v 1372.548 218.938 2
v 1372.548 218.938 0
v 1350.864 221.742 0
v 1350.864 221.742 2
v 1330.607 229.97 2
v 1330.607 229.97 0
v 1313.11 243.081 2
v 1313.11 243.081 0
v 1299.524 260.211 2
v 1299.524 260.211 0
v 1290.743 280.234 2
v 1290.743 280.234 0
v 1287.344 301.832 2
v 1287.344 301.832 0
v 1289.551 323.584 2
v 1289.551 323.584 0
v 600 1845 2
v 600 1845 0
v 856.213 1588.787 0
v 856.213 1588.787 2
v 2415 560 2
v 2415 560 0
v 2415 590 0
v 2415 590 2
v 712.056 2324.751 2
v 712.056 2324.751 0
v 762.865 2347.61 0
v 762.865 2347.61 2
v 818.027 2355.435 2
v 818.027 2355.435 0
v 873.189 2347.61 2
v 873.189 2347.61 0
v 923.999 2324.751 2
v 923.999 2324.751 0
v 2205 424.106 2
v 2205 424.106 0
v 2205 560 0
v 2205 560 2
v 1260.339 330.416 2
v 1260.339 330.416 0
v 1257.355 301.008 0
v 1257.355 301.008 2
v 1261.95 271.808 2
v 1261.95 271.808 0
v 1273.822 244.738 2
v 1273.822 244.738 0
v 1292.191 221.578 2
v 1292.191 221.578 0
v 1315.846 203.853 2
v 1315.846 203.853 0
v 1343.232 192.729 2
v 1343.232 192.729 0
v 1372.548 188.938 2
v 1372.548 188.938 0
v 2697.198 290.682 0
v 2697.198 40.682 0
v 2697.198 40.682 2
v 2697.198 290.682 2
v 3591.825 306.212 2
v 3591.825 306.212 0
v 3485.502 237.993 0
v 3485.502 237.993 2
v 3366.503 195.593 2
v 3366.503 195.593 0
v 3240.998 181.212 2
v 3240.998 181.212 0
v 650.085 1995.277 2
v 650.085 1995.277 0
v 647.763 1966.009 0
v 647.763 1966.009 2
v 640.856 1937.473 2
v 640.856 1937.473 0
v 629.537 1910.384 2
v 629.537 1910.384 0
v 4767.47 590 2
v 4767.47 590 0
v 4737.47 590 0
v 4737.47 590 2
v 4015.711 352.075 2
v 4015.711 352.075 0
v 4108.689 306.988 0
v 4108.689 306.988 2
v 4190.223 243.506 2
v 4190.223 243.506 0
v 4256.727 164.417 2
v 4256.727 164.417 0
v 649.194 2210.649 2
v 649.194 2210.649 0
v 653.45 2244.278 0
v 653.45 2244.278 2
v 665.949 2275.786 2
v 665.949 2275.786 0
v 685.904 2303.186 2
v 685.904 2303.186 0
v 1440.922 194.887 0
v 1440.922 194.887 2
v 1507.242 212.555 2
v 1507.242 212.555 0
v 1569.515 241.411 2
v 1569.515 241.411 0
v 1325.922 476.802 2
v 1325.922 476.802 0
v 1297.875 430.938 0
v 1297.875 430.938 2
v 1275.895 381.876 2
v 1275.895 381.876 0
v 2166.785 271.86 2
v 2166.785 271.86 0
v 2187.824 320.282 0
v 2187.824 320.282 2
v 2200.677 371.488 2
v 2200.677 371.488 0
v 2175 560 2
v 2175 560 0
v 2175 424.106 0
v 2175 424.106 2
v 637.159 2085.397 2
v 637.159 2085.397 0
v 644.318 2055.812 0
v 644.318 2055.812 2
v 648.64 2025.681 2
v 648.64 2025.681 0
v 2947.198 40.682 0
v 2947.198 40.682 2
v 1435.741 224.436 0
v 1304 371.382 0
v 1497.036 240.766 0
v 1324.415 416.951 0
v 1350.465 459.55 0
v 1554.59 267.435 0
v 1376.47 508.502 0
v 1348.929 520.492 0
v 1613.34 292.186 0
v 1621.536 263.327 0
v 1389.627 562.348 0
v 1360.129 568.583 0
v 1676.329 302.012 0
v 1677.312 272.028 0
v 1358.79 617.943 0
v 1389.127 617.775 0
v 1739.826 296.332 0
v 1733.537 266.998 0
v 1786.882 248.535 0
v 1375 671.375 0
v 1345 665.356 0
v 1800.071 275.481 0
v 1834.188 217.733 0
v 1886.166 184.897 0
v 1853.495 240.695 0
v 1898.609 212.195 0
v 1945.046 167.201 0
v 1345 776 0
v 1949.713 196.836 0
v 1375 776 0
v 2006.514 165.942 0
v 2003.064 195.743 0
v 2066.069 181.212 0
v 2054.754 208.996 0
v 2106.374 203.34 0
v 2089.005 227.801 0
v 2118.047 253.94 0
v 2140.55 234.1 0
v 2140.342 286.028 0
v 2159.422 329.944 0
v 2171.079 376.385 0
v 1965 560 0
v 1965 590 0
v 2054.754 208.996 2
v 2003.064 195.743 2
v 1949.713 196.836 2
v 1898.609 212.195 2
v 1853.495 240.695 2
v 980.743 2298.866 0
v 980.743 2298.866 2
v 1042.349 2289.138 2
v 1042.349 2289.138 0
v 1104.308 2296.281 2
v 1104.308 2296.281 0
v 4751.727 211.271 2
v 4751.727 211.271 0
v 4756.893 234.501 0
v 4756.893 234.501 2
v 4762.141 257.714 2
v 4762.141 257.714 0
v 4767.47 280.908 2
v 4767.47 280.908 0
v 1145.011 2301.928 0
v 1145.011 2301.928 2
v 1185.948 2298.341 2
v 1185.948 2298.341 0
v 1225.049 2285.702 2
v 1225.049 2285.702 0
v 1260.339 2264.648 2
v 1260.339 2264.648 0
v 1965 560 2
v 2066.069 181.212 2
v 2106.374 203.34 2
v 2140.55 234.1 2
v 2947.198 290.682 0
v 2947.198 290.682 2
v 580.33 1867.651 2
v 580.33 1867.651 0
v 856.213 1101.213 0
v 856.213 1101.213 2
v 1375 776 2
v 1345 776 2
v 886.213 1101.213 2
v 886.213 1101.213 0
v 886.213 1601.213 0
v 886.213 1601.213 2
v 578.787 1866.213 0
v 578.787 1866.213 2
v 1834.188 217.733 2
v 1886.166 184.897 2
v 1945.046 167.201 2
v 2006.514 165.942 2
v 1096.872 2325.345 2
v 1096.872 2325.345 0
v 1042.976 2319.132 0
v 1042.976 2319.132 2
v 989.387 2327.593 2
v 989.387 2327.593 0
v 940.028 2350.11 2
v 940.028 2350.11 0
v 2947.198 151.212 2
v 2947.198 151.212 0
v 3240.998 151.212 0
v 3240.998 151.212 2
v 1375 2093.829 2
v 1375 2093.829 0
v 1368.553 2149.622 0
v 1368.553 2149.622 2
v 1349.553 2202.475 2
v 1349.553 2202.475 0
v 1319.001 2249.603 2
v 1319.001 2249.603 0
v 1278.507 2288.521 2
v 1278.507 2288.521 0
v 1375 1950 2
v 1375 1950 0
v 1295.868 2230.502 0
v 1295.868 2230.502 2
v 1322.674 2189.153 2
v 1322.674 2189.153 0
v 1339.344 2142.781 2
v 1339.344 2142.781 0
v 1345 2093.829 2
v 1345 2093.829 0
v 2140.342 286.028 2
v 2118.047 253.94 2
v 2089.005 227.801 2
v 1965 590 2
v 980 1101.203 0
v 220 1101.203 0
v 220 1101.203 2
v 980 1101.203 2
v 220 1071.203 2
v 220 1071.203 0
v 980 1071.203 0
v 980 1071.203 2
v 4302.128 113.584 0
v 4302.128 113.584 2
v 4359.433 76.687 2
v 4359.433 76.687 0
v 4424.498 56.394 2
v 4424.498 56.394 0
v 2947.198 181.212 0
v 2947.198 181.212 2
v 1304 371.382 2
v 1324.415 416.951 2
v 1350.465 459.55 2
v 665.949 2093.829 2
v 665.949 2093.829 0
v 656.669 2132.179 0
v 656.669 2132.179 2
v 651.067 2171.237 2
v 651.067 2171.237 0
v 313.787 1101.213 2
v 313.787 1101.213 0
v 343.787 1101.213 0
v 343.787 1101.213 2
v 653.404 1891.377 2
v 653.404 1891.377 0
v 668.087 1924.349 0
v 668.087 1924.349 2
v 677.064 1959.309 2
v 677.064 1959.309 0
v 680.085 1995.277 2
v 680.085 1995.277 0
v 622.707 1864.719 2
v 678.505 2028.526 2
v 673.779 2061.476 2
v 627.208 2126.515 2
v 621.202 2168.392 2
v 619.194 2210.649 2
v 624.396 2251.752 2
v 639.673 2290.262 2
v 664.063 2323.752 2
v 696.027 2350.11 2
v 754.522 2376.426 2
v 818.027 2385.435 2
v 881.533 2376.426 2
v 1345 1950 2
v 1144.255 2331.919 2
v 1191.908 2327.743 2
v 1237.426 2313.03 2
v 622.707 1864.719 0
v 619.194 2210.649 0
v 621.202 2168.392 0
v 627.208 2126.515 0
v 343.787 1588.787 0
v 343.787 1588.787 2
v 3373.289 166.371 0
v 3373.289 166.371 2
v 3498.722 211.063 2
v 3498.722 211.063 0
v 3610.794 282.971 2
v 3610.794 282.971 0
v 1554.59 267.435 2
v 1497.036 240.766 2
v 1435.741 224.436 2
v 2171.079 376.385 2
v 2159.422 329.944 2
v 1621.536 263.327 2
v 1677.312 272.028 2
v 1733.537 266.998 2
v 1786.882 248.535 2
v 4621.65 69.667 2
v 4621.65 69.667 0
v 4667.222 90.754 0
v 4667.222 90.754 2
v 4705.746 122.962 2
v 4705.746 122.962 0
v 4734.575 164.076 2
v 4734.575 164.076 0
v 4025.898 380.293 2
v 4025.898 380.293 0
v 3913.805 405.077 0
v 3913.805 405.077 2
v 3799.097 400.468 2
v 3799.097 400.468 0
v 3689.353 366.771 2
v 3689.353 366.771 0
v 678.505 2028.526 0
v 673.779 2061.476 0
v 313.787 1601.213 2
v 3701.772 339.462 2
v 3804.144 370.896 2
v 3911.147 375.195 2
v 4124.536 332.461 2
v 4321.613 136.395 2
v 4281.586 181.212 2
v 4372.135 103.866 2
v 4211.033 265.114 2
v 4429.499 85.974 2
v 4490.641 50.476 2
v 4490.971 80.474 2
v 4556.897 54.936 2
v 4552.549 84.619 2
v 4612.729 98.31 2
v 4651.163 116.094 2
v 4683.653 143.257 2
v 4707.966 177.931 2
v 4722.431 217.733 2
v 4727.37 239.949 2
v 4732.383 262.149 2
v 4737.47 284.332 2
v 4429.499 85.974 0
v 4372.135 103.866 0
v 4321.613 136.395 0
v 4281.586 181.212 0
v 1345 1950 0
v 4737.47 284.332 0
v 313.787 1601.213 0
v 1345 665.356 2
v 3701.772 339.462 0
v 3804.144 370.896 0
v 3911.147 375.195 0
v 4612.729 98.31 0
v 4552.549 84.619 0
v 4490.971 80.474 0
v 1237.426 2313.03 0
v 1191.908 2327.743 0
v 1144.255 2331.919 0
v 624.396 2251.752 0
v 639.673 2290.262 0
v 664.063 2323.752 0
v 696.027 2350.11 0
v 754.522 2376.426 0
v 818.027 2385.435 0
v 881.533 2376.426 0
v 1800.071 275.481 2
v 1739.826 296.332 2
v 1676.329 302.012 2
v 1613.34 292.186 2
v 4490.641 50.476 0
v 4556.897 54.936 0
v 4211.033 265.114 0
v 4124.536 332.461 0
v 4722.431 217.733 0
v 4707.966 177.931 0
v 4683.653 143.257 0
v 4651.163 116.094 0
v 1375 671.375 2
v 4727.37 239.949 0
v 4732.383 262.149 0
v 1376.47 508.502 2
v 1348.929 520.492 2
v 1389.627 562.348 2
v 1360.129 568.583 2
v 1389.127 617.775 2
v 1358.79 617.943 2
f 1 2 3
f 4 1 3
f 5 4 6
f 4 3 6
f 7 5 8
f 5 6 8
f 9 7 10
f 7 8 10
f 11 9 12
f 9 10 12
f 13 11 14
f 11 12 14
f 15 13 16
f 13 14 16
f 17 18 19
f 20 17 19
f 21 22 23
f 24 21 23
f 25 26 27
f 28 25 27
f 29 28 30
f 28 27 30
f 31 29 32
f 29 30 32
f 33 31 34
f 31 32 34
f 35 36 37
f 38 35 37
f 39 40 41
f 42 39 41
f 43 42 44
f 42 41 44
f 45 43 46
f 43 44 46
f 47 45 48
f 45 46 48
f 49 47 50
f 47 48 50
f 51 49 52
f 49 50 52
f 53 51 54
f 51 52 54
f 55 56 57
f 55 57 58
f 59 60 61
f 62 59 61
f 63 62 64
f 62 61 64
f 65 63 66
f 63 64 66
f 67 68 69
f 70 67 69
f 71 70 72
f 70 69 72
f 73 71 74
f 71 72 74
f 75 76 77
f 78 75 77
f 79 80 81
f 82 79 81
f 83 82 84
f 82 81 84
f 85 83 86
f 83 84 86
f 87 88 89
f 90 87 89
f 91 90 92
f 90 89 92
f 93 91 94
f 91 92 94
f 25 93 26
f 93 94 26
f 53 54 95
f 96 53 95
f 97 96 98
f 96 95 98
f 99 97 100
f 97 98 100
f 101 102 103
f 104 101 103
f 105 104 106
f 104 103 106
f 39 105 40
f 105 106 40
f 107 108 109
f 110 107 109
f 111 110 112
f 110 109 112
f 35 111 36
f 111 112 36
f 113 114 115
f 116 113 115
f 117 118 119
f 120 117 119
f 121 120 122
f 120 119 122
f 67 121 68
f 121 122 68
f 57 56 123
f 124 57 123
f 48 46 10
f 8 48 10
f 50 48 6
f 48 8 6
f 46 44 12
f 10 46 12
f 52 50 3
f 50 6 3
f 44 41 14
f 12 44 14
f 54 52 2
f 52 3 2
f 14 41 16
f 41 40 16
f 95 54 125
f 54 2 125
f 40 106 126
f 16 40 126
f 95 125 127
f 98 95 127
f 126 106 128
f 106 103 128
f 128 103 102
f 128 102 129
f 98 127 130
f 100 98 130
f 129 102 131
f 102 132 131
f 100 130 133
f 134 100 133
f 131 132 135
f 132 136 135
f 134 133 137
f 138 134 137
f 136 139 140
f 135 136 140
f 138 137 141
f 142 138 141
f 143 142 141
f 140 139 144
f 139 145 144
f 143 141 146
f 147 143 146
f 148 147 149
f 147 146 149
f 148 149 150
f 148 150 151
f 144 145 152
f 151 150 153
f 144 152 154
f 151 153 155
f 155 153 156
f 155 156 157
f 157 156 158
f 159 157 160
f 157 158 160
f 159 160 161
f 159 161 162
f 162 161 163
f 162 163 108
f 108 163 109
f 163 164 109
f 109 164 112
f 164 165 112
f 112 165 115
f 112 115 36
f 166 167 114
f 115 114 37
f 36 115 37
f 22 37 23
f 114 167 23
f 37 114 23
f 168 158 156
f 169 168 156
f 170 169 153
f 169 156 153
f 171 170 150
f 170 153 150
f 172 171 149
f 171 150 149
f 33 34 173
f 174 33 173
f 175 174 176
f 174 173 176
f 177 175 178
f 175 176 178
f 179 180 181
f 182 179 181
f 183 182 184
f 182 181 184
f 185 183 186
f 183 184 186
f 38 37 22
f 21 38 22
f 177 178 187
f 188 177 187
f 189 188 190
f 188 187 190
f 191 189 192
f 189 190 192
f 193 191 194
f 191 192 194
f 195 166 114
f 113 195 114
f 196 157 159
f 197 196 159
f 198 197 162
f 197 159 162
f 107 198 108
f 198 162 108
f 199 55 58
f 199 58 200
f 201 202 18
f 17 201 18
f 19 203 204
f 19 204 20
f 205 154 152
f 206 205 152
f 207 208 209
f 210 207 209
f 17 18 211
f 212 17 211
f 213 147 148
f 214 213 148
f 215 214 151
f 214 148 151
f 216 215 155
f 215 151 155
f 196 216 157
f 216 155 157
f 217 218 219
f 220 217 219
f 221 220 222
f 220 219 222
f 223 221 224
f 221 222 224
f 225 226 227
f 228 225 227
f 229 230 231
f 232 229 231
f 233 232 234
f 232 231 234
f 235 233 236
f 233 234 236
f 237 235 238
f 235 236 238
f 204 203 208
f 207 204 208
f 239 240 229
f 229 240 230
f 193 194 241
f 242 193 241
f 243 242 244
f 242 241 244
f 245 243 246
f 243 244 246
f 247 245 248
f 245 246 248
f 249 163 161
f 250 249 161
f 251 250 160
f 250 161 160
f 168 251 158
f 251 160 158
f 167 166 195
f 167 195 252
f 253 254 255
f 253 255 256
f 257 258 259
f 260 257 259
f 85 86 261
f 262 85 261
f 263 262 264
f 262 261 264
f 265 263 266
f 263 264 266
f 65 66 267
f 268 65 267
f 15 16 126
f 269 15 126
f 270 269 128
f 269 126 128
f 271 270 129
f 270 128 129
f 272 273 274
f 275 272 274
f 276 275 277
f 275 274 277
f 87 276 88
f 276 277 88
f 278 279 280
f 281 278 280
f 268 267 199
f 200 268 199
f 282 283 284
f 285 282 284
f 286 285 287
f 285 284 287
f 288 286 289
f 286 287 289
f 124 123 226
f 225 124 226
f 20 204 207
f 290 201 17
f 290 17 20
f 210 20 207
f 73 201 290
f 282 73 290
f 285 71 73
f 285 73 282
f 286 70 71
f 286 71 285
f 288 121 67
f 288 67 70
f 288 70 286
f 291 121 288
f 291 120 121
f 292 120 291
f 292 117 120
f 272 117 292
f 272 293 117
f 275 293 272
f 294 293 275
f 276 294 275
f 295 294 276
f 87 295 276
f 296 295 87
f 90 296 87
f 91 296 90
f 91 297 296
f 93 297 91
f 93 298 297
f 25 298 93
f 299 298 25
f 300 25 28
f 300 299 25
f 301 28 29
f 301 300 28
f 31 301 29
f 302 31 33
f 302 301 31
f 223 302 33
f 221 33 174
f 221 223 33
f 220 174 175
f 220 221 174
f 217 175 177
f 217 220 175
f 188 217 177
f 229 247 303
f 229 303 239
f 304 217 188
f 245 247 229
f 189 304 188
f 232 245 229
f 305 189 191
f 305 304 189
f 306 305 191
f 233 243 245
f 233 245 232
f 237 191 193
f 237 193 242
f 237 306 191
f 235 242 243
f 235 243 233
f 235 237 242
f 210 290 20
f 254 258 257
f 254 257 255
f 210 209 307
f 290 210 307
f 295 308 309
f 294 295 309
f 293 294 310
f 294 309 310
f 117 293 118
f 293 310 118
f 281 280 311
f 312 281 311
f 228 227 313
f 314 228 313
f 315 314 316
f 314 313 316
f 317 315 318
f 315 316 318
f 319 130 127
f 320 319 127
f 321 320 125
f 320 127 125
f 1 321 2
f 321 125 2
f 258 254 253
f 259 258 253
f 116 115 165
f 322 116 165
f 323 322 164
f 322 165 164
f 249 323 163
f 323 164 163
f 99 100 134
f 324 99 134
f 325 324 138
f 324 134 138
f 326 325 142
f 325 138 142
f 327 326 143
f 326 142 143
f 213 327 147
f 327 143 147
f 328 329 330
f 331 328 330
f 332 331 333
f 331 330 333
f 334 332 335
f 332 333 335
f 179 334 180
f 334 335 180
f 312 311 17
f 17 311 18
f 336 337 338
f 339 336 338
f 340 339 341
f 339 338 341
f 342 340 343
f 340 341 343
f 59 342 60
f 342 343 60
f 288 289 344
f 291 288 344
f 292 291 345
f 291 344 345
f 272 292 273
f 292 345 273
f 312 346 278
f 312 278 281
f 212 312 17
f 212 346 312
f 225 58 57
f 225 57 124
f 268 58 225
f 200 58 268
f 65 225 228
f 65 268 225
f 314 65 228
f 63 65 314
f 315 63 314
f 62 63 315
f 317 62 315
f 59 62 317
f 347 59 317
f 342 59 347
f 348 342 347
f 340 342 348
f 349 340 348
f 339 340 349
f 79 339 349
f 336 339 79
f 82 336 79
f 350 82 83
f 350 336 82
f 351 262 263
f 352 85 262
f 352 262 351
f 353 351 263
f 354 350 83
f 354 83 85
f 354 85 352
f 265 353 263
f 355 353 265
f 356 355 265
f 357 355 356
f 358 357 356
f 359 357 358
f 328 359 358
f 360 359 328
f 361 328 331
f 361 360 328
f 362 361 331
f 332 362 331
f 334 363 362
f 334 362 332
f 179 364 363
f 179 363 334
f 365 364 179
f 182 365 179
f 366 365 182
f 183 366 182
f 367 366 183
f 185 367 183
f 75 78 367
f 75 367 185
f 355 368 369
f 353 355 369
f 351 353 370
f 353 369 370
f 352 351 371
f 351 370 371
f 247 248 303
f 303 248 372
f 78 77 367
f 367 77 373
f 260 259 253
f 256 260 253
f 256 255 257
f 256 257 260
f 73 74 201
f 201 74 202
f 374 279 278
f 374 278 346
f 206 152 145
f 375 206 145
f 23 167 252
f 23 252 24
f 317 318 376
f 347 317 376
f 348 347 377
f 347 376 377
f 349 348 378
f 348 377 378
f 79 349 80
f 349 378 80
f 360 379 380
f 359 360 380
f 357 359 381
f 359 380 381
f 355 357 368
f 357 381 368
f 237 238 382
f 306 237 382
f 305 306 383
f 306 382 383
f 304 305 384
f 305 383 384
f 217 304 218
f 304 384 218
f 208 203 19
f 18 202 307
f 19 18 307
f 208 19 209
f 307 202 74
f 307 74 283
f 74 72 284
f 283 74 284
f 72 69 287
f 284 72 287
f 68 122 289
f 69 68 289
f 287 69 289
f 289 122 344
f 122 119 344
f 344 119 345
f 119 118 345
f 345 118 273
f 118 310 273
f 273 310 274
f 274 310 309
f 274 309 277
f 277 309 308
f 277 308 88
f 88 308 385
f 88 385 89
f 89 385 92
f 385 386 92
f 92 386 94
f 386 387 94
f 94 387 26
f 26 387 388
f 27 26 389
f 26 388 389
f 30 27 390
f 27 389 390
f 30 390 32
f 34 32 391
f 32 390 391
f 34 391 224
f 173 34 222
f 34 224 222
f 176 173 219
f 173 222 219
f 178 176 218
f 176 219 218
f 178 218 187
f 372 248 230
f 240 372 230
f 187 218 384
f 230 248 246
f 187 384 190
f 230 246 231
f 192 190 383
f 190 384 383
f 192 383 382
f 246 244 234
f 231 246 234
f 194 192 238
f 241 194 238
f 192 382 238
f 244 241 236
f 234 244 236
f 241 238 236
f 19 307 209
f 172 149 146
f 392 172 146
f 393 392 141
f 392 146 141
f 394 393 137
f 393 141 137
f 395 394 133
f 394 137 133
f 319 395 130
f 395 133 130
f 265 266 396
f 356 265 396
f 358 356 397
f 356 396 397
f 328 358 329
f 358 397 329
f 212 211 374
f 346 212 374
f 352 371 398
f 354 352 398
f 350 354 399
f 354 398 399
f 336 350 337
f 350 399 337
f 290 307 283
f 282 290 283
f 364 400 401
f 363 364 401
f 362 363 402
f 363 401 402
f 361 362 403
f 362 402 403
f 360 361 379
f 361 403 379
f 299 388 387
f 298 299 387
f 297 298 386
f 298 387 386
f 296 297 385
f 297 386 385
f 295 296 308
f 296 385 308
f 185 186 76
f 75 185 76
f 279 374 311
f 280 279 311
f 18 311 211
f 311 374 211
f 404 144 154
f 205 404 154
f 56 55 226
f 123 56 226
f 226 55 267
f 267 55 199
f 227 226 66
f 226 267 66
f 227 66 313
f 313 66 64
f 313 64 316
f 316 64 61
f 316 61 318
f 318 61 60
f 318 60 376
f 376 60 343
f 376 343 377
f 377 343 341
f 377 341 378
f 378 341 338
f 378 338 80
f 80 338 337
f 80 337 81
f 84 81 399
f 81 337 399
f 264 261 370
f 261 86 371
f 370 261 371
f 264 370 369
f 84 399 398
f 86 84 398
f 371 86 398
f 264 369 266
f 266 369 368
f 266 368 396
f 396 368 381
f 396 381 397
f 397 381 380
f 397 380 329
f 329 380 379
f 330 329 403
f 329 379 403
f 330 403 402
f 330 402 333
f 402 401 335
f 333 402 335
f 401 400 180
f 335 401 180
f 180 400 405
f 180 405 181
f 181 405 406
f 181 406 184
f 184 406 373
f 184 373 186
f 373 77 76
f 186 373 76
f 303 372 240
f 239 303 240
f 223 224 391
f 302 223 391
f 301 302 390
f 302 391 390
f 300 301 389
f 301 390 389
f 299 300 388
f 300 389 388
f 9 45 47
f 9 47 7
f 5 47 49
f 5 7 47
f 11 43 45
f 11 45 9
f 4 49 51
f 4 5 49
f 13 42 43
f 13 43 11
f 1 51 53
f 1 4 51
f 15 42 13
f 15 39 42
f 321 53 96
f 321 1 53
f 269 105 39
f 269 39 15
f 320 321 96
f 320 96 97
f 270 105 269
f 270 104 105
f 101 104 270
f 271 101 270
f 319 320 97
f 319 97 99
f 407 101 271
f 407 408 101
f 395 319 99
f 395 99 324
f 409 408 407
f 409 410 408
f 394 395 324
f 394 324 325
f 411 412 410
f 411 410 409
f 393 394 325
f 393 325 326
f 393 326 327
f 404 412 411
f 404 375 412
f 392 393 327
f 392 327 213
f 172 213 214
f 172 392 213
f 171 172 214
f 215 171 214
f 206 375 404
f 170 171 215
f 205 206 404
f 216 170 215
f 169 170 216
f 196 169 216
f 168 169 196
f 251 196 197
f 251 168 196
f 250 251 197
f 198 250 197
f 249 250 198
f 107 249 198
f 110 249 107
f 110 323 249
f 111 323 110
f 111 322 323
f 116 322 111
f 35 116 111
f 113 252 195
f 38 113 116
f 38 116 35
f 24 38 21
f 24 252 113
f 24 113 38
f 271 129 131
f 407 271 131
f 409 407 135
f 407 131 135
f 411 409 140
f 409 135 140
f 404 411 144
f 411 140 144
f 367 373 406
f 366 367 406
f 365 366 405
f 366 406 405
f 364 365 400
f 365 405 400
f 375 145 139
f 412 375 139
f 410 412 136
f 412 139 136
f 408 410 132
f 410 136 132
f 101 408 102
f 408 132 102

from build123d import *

# Parameters (mm, degrees)
EXTRUDE_THIN4_DEPTH = 2
SKETCH3_W           = 250
SKETCH3_H           = 250
BOSS_EXTRUDE3_DEPTH = 2
SKETCH4_W           = 450
SKETCH4_H           = 30
BOSS_EXTRUDE4_DEPTH = 2
SKETCH5_W           = 30
SKETCH5_H           = 500
BOSS_EXTRUDE5_DEPTH = 2
SKETCH6_W           = 760
SKETCH6_H           = 30
BOSS_EXTRUDE7_DEPTH = 2


# Read off the part's stored shape, not the designer's step: Extrude-Thin4
with BuildPart() as part:
    # Extrude-Thin4 outline → Extrude-Thin4 (new body)
    with BuildSketch(Plane.XY):
        with BuildLine():
            Line((580.329534742, 1867.651110272), (600, 1845))
            Line((600, 1845), (865, 1580))
            Line((865, 1580), (886.213203436, 1601.213203436))
            Line((886.213203436, 1601.213203436), (622.7072175, 1864.719189371))
            Line((622.7072175, 1864.719189371), (653.403971795, 1891.376577537))
            ThreePointArc((653.403971795, 1891.376577537), (673.30803603, 1941.641063842), (680.084696225, 1995.276567319))
            ThreePointArc((680.084696225, 1995.276567319), (676.532858701, 2045.057080452), (665.949306803, 2093.829034142))
            ThreePointArc((665.949306803, 2093.829034142), (653.403971795, 2151.641430576), (649.193760322, 2210.649334548))
            ThreePointArc((649.193760322, 2210.649334548), (665.949306803, 2275.785664392), (712.05624475, 2324.751367457))
            ThreePointArc((712.05624475, 2324.751367457), (818.027452504, 2355.435014772), (923.998660258, 2324.751367457))
            ThreePointArc((923.998660258, 2324.751367457), (1011.215225634, 2291.908815799), (1104.307879422, 2296.281490747))
            ThreePointArc((1104.307879422, 2296.281490747), (1185.947658515, 2298.341290514), (1260.339044564, 2264.648294402))
            ThreePointArc((1260.339044564, 2264.648294402), (1322.673710037, 2189.153082854), (1345, 2093.829034142))
            Line((1345, 2093.829034142), (1345, 1950))
            Line((1345, 1950), (1375, 1950))
            Line((1375, 1950), (1375, 2093.829034142))
            ThreePointArc((1375, 2093.829034142), (1349.553484223, 2202.475160007), (1278.507195252, 2288.521256108))
            ThreePointArc((1278.507195252, 2288.521256108), (1191.90848294, 2327.743136922), (1096.871945536, 2325.345332324))
            ThreePointArc((1096.871945536, 2325.345332324), (1015.894102839, 2321.541704759), (940.027651252, 2350.110220896))
            ThreePointArc((940.027651252, 2350.110220896), (818.027452504, 2385.435014772), (696.027253756, 2350.110220896))
            ThreePointArc((696.027253756, 2350.110220896), (639.673179521, 2290.262029098), (619.193760322, 2210.649334548))
            ThreePointArc((619.193760322, 2210.649334548), (623.707873677, 2147.382116479), (637.158757241, 2085.396700186))
            ThreePointArc((637.158757241, 2085.396700186), (646.836760583, 2040.797766355), (650.084696225, 1995.276567319))
            ThreePointArc((650.084696225, 1995.276567319), (644.874732457, 1951.604472445), (629.537269054, 1910.383630513))
            Line((629.537269054, 1910.383630513), (580.329534742, 1867.651110272))
        make_face()
        Polygon((578.786796564, 1866.213203436), (313.786796564, 1601.213203436), (335, 1580), (600, 1845), align=None)
        with BuildLine():
            Line((1375, 671.37495586), (1375, 776))
            Line((1375, 776), (1345, 776))
            Line((1345, 776), (1345, 665.356203402))
            ThreePointArc((1345, 665.356203402), (1360.128516063, 568.583046436), (1325.921730839, 476.80172071))
            ThreePointArc((1325.921730839, 476.80172071), (1286.101995144, 406.757699666), (1260.339044564, 330.416055643))
            ThreePointArc((1260.339044564, 330.416055643), (1282.260904948, 232.566505826), (1372.547552838, 188.938262968))
            ThreePointArc((1372.547552838, 188.938262968), (1474.465890598, 202.281284498), (1569.514565573, 241.410981413))
            ThreePointArc((1569.514565573, 241.410981413), (1705.577822181, 271.230050509), (1834.187549466, 217.73309052))
            ThreePointArc((1834.187549466, 217.73309052), (1945.045622854, 167.201036401), (2066.069190222, 181.211642034))
            ThreePointArc((2066.069190222, 181.211642034), (2124.350152694, 217.73309052), (2166.78545843, 271.860085755))
            ThreePointArc((2166.78545843, 271.860085755), (2195.300446849, 345.621452904), (2205, 424.105607464))
            Line((2205, 424.105607464), (2205, 560))
            Line((2205, 560), (2175, 560))
            Line((2175, 560), (2175, 424.105607464))
            ThreePointArc((2175, 424.105607464), (2166.203072501, 352.92506886), (2140.341645499, 286.02782226))
            ThreePointArc((2140.341645499, 286.02782226), (2104.28074565, 240.031496313), (2054.754439327, 208.996105537))
            ThreePointArc((2054.754439327, 208.996105537), (1949.713097583, 196.835723503), (1853.494807006, 240.694575801))
            ThreePointArc((1853.494807006, 240.694575801), (1708.250974391, 301.110717457), (1554.589589012, 267.434914142))
            ThreePointArc((1554.589589012, 267.434914142), (1466.743131436, 231.270230511), (1372.547552838, 218.938262968))
            ThreePointArc((1372.547552838, 218.938262968), (1305.765674919, 251.2085494), (1289.550840964, 323.58444155))
            ThreePointArc((1289.550840964, 323.58444155), (1313.479960119, 394.492014451), (1350.465289002, 459.550235189))
            ThreePointArc((1350.465289002, 459.550235189), (1389.627244127, 562.34751421), (1375, 671.37495586))
        make_face()
        with BuildLine():
            Line((4767.469655509, 280.907659612), (4767.469655509, 590))
            Line((4767.469655509, 590), (4737.469655509, 590))
            Line((4737.469655509, 590), (4737.469655509, 284.332140954))
            ThreePointArc((4737.469655509, 284.332140954), (4729.867341385, 251.051330007), (4722.430778015, 217.73309052))
            ThreePointArc((4722.430778015, 217.73309052), (4683.652807685, 143.257064619), (4612.729150001, 98.30993793))
            ThreePointArc((4612.729150001, 98.30993793), (4521.841227213, 81.341666779), (4429.499055865, 85.974174218))
            ThreePointArc((4429.499055865, 85.974174218), (4345.775905249, 118.424580356), (4281.585721472, 181.211642034))
            ThreePointArc((4281.585721472, 181.211642034), (4169.554635372, 301.060770828), (4025.898417544, 380.292513234))
            ThreePointArc((4025.898417544, 380.292513234), (3799.09677669, 400.468186566), (3591.824622503, 306.211642034))
            ThreePointArc((3591.824622503, 306.211642034), (3427.213067923, 213.395077999), (3240.997856648, 181.211642034))
            Line((3240.997856648, 181.211642034), (2947.198336269, 181.211642034))
            Line((2947.198336269, 181.211642034), (2947.198336269, 151.211642034))
            Line((2947.198336269, 151.211642034), (3240.997856648, 151.211642034))
            ThreePointArc((3240.997856648, 151.211642034), (3437.282062755, 185.13529486), (3610.794463195, 282.970619163))
            ThreePointArc((3610.794463195, 282.970619163), (3804.143731696, 370.895762838), (4015.710652135, 352.075329888))
            ThreePointArc((4015.710652135, 352.075329888), (4151.124134763, 277.389762246), (4256.727078796, 164.417360736))
            ThreePointArc((4256.727078796, 164.417360736), (4329.535042979, 93.20089322), (4424.498350336, 56.393894568))
            ThreePointArc((4424.498350336, 56.393894568), (4523.856382389, 51.409424136), (4621.649676761, 69.666889868))
            ThreePointArc((4621.649676761, 69.666889868), (4705.746187648, 122.962174577), (4751.726500995, 211.27084516))
            ThreePointArc((4751.726500995, 211.27084516), (4759.507066826, 246.109827809), (4767.469655509, 280.907659612))
        make_face()
    extrude(amount=EXTRUDE_THIN4_DEPTH)

    # Sketch3 → Boss-Extrude3 (add)
    with BuildSketch(Plane.XY):
        with Locations((2822.198336269, 165.681992538)):
            Rectangle(SKETCH3_W, SKETCH3_H)
    extrude(amount=BOSS_EXTRUDE3_DEPTH)

    # Sketch4 → Boss-Extrude4 (add)
    with BuildSketch(Plane.XY):
        with Locations((2190, 575)):
            Rectangle(SKETCH4_W, SKETCH4_H)
    extrude(amount=BOSS_EXTRUDE4_DEPTH)

    # Sketch5 → Boss-Extrude5 (add)
    with BuildSketch(Plane.XY):
        with Locations((328.786796564, 1351.213203436)):
            Rectangle(SKETCH5_W, SKETCH5_H)
        with Locations((871.213203436, 1351.213203436)):
            Rectangle(SKETCH5_W, SKETCH5_H)
    extrude(amount=BOSS_EXTRUDE5_DEPTH)


with BuildPart() as body_2:
    # Sketch6 → Boss-Extrude7 (new body)
    with BuildSketch(Plane.XY):
        with Locations((600, 1086.203203436)):
            Rectangle(SKETCH6_W, SKETCH6_H)
    extrude(amount=BOSS_EXTRUDE7_DEPTH)


solid = Compound([part.part, body_2.part])
